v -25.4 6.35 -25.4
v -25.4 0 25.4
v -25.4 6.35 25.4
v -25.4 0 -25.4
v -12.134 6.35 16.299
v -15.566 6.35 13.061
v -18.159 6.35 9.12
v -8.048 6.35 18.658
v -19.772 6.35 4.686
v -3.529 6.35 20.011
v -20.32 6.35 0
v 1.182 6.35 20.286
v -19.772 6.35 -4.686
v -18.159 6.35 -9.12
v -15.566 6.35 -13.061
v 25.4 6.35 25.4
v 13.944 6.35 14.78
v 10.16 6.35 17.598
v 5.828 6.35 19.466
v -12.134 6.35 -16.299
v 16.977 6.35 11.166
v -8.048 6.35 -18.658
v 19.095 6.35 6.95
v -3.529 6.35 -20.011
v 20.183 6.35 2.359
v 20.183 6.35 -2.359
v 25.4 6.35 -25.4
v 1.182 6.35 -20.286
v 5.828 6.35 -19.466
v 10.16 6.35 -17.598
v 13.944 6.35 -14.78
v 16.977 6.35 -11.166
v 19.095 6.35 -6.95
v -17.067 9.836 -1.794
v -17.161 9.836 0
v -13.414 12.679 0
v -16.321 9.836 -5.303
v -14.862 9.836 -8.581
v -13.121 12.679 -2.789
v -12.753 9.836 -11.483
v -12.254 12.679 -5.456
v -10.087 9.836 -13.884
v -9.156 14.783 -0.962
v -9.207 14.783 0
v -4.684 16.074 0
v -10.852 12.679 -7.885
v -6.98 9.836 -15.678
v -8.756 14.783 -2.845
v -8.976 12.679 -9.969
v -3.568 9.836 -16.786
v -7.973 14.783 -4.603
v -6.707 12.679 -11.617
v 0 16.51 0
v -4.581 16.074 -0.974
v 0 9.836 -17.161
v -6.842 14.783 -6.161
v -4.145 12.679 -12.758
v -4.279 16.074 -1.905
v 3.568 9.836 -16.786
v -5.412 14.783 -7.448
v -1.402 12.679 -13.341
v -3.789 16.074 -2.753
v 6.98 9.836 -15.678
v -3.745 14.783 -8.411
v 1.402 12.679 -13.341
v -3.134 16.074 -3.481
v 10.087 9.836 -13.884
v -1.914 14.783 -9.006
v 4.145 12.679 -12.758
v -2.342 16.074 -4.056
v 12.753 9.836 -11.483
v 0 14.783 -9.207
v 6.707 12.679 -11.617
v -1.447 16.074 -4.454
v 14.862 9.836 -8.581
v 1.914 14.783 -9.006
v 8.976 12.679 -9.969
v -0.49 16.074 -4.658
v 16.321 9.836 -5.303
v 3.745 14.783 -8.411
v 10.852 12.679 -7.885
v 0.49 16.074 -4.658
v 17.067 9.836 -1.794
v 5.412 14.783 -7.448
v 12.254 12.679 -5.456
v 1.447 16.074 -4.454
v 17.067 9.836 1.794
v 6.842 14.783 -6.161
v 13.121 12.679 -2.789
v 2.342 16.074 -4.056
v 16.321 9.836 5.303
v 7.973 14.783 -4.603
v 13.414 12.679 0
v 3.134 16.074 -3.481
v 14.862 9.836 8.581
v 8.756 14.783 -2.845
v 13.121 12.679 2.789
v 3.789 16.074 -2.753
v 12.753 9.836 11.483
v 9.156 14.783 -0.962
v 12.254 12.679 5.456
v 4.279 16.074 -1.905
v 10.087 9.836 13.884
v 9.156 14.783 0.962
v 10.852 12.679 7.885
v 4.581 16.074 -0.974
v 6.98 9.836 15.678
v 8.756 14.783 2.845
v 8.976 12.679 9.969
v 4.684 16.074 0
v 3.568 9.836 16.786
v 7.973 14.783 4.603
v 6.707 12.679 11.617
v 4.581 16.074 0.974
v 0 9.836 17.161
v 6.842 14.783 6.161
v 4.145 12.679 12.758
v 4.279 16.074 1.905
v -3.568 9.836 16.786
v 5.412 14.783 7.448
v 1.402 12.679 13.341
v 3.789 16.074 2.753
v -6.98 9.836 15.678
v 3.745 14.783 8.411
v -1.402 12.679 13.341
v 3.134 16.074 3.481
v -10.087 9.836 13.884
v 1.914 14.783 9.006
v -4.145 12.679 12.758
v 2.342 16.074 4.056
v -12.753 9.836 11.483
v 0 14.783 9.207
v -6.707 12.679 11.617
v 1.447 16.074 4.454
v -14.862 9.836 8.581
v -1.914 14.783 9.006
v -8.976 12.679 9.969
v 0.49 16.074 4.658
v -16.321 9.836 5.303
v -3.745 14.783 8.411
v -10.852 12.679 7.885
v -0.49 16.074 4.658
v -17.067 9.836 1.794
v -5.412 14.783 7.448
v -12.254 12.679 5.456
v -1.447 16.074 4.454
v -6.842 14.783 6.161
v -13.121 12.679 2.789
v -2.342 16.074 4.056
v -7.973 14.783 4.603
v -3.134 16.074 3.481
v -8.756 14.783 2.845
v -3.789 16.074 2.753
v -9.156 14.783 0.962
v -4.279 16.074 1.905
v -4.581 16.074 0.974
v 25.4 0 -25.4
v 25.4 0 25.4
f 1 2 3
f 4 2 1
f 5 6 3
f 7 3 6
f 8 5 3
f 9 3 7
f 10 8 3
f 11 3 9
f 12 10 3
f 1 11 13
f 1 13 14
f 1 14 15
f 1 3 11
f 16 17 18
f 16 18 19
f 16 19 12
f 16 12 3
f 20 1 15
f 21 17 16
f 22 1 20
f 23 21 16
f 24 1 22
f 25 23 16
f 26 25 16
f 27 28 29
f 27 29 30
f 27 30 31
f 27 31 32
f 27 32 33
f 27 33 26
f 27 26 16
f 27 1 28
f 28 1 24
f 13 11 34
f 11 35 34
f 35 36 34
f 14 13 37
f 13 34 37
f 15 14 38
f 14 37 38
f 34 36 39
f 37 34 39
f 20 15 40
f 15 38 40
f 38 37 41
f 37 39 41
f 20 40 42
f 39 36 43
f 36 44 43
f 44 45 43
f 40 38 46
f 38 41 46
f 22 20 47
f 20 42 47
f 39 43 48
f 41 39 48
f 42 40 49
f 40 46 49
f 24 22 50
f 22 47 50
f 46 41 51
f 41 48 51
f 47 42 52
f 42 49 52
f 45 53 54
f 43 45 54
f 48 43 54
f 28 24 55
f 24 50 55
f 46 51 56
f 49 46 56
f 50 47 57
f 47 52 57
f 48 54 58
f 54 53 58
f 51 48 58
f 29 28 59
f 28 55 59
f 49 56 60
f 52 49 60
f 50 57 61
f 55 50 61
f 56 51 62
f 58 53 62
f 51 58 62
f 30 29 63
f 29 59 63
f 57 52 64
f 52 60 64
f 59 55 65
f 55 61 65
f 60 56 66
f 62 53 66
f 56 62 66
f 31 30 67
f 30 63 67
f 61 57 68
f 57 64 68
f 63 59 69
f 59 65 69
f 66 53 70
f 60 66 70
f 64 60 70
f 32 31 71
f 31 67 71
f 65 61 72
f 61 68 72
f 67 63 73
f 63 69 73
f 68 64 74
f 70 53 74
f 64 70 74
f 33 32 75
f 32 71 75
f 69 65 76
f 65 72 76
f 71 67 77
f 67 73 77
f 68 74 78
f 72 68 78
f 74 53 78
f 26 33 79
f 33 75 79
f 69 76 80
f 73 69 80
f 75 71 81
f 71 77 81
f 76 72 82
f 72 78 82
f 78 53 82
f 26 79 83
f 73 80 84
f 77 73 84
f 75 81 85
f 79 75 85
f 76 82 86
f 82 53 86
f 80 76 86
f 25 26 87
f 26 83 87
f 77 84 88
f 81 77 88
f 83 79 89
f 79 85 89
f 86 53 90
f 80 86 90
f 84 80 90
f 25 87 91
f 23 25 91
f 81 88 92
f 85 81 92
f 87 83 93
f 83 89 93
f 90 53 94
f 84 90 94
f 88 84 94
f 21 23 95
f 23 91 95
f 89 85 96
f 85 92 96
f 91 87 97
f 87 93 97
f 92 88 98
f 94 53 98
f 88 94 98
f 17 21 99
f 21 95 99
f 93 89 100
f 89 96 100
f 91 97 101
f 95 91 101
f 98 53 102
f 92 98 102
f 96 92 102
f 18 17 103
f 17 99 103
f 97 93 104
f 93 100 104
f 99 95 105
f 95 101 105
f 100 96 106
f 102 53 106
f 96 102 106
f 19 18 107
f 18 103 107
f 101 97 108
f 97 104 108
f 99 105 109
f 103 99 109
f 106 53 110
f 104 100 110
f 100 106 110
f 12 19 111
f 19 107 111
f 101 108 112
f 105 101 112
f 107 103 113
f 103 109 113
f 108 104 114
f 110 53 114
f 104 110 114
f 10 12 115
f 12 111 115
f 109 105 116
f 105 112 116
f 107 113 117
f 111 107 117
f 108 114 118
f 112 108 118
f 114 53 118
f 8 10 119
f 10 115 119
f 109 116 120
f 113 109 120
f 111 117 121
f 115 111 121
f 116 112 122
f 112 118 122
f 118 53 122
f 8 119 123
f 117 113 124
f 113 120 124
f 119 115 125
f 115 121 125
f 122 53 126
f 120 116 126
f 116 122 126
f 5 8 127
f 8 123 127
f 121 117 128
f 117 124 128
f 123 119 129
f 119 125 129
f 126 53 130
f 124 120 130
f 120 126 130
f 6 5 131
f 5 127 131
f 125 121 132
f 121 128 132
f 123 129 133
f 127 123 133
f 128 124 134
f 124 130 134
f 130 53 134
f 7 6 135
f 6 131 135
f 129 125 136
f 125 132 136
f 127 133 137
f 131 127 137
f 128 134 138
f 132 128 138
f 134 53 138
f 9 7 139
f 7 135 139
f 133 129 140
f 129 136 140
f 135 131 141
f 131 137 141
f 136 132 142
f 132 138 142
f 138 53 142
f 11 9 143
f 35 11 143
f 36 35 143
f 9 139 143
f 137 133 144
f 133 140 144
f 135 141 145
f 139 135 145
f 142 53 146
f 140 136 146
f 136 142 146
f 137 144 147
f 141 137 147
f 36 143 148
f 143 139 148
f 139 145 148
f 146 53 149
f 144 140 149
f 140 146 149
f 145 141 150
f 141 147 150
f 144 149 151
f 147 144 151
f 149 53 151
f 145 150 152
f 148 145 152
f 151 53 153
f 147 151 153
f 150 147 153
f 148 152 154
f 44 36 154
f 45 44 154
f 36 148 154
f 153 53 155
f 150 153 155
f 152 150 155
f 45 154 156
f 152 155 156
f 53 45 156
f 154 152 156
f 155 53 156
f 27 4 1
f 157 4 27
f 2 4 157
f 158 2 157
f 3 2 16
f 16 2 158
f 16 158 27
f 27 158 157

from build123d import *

# Parameters (mm, degrees)
SKETCH1_W           = 50.8
SKETCH1_H           = 50.8
BOSS_EXTRUDE1_DEPTH = 6.35


with BuildPart() as part:
    # Sketch1 → Boss-Extrude1 (new body)
    with BuildSketch(Plane(origin=(0, 0, 0), x_dir=(1, 0, 0), z_dir=(0, 1, 0))):
        Rectangle(SKETCH1_W, SKETCH1_H)
    extrude(amount=BOSS_EXTRUDE1_DEPTH)

    # Sketch2 → Revolve1 (revolve)
    with BuildSketch(Plane.XY):
        with BuildLine():
            Line((0, 6.35), (-20.32, 6.35))
            ThreePointArc((-20.32, 6.35), (-11.359225326, 13.828450651), (0, 16.51))
            Line((0, 16.51), (0, 6.35))
        make_face()
    revolve(axis=Axis((0, 16.51, 0), (0, -1, 0)))


solid = part.part
